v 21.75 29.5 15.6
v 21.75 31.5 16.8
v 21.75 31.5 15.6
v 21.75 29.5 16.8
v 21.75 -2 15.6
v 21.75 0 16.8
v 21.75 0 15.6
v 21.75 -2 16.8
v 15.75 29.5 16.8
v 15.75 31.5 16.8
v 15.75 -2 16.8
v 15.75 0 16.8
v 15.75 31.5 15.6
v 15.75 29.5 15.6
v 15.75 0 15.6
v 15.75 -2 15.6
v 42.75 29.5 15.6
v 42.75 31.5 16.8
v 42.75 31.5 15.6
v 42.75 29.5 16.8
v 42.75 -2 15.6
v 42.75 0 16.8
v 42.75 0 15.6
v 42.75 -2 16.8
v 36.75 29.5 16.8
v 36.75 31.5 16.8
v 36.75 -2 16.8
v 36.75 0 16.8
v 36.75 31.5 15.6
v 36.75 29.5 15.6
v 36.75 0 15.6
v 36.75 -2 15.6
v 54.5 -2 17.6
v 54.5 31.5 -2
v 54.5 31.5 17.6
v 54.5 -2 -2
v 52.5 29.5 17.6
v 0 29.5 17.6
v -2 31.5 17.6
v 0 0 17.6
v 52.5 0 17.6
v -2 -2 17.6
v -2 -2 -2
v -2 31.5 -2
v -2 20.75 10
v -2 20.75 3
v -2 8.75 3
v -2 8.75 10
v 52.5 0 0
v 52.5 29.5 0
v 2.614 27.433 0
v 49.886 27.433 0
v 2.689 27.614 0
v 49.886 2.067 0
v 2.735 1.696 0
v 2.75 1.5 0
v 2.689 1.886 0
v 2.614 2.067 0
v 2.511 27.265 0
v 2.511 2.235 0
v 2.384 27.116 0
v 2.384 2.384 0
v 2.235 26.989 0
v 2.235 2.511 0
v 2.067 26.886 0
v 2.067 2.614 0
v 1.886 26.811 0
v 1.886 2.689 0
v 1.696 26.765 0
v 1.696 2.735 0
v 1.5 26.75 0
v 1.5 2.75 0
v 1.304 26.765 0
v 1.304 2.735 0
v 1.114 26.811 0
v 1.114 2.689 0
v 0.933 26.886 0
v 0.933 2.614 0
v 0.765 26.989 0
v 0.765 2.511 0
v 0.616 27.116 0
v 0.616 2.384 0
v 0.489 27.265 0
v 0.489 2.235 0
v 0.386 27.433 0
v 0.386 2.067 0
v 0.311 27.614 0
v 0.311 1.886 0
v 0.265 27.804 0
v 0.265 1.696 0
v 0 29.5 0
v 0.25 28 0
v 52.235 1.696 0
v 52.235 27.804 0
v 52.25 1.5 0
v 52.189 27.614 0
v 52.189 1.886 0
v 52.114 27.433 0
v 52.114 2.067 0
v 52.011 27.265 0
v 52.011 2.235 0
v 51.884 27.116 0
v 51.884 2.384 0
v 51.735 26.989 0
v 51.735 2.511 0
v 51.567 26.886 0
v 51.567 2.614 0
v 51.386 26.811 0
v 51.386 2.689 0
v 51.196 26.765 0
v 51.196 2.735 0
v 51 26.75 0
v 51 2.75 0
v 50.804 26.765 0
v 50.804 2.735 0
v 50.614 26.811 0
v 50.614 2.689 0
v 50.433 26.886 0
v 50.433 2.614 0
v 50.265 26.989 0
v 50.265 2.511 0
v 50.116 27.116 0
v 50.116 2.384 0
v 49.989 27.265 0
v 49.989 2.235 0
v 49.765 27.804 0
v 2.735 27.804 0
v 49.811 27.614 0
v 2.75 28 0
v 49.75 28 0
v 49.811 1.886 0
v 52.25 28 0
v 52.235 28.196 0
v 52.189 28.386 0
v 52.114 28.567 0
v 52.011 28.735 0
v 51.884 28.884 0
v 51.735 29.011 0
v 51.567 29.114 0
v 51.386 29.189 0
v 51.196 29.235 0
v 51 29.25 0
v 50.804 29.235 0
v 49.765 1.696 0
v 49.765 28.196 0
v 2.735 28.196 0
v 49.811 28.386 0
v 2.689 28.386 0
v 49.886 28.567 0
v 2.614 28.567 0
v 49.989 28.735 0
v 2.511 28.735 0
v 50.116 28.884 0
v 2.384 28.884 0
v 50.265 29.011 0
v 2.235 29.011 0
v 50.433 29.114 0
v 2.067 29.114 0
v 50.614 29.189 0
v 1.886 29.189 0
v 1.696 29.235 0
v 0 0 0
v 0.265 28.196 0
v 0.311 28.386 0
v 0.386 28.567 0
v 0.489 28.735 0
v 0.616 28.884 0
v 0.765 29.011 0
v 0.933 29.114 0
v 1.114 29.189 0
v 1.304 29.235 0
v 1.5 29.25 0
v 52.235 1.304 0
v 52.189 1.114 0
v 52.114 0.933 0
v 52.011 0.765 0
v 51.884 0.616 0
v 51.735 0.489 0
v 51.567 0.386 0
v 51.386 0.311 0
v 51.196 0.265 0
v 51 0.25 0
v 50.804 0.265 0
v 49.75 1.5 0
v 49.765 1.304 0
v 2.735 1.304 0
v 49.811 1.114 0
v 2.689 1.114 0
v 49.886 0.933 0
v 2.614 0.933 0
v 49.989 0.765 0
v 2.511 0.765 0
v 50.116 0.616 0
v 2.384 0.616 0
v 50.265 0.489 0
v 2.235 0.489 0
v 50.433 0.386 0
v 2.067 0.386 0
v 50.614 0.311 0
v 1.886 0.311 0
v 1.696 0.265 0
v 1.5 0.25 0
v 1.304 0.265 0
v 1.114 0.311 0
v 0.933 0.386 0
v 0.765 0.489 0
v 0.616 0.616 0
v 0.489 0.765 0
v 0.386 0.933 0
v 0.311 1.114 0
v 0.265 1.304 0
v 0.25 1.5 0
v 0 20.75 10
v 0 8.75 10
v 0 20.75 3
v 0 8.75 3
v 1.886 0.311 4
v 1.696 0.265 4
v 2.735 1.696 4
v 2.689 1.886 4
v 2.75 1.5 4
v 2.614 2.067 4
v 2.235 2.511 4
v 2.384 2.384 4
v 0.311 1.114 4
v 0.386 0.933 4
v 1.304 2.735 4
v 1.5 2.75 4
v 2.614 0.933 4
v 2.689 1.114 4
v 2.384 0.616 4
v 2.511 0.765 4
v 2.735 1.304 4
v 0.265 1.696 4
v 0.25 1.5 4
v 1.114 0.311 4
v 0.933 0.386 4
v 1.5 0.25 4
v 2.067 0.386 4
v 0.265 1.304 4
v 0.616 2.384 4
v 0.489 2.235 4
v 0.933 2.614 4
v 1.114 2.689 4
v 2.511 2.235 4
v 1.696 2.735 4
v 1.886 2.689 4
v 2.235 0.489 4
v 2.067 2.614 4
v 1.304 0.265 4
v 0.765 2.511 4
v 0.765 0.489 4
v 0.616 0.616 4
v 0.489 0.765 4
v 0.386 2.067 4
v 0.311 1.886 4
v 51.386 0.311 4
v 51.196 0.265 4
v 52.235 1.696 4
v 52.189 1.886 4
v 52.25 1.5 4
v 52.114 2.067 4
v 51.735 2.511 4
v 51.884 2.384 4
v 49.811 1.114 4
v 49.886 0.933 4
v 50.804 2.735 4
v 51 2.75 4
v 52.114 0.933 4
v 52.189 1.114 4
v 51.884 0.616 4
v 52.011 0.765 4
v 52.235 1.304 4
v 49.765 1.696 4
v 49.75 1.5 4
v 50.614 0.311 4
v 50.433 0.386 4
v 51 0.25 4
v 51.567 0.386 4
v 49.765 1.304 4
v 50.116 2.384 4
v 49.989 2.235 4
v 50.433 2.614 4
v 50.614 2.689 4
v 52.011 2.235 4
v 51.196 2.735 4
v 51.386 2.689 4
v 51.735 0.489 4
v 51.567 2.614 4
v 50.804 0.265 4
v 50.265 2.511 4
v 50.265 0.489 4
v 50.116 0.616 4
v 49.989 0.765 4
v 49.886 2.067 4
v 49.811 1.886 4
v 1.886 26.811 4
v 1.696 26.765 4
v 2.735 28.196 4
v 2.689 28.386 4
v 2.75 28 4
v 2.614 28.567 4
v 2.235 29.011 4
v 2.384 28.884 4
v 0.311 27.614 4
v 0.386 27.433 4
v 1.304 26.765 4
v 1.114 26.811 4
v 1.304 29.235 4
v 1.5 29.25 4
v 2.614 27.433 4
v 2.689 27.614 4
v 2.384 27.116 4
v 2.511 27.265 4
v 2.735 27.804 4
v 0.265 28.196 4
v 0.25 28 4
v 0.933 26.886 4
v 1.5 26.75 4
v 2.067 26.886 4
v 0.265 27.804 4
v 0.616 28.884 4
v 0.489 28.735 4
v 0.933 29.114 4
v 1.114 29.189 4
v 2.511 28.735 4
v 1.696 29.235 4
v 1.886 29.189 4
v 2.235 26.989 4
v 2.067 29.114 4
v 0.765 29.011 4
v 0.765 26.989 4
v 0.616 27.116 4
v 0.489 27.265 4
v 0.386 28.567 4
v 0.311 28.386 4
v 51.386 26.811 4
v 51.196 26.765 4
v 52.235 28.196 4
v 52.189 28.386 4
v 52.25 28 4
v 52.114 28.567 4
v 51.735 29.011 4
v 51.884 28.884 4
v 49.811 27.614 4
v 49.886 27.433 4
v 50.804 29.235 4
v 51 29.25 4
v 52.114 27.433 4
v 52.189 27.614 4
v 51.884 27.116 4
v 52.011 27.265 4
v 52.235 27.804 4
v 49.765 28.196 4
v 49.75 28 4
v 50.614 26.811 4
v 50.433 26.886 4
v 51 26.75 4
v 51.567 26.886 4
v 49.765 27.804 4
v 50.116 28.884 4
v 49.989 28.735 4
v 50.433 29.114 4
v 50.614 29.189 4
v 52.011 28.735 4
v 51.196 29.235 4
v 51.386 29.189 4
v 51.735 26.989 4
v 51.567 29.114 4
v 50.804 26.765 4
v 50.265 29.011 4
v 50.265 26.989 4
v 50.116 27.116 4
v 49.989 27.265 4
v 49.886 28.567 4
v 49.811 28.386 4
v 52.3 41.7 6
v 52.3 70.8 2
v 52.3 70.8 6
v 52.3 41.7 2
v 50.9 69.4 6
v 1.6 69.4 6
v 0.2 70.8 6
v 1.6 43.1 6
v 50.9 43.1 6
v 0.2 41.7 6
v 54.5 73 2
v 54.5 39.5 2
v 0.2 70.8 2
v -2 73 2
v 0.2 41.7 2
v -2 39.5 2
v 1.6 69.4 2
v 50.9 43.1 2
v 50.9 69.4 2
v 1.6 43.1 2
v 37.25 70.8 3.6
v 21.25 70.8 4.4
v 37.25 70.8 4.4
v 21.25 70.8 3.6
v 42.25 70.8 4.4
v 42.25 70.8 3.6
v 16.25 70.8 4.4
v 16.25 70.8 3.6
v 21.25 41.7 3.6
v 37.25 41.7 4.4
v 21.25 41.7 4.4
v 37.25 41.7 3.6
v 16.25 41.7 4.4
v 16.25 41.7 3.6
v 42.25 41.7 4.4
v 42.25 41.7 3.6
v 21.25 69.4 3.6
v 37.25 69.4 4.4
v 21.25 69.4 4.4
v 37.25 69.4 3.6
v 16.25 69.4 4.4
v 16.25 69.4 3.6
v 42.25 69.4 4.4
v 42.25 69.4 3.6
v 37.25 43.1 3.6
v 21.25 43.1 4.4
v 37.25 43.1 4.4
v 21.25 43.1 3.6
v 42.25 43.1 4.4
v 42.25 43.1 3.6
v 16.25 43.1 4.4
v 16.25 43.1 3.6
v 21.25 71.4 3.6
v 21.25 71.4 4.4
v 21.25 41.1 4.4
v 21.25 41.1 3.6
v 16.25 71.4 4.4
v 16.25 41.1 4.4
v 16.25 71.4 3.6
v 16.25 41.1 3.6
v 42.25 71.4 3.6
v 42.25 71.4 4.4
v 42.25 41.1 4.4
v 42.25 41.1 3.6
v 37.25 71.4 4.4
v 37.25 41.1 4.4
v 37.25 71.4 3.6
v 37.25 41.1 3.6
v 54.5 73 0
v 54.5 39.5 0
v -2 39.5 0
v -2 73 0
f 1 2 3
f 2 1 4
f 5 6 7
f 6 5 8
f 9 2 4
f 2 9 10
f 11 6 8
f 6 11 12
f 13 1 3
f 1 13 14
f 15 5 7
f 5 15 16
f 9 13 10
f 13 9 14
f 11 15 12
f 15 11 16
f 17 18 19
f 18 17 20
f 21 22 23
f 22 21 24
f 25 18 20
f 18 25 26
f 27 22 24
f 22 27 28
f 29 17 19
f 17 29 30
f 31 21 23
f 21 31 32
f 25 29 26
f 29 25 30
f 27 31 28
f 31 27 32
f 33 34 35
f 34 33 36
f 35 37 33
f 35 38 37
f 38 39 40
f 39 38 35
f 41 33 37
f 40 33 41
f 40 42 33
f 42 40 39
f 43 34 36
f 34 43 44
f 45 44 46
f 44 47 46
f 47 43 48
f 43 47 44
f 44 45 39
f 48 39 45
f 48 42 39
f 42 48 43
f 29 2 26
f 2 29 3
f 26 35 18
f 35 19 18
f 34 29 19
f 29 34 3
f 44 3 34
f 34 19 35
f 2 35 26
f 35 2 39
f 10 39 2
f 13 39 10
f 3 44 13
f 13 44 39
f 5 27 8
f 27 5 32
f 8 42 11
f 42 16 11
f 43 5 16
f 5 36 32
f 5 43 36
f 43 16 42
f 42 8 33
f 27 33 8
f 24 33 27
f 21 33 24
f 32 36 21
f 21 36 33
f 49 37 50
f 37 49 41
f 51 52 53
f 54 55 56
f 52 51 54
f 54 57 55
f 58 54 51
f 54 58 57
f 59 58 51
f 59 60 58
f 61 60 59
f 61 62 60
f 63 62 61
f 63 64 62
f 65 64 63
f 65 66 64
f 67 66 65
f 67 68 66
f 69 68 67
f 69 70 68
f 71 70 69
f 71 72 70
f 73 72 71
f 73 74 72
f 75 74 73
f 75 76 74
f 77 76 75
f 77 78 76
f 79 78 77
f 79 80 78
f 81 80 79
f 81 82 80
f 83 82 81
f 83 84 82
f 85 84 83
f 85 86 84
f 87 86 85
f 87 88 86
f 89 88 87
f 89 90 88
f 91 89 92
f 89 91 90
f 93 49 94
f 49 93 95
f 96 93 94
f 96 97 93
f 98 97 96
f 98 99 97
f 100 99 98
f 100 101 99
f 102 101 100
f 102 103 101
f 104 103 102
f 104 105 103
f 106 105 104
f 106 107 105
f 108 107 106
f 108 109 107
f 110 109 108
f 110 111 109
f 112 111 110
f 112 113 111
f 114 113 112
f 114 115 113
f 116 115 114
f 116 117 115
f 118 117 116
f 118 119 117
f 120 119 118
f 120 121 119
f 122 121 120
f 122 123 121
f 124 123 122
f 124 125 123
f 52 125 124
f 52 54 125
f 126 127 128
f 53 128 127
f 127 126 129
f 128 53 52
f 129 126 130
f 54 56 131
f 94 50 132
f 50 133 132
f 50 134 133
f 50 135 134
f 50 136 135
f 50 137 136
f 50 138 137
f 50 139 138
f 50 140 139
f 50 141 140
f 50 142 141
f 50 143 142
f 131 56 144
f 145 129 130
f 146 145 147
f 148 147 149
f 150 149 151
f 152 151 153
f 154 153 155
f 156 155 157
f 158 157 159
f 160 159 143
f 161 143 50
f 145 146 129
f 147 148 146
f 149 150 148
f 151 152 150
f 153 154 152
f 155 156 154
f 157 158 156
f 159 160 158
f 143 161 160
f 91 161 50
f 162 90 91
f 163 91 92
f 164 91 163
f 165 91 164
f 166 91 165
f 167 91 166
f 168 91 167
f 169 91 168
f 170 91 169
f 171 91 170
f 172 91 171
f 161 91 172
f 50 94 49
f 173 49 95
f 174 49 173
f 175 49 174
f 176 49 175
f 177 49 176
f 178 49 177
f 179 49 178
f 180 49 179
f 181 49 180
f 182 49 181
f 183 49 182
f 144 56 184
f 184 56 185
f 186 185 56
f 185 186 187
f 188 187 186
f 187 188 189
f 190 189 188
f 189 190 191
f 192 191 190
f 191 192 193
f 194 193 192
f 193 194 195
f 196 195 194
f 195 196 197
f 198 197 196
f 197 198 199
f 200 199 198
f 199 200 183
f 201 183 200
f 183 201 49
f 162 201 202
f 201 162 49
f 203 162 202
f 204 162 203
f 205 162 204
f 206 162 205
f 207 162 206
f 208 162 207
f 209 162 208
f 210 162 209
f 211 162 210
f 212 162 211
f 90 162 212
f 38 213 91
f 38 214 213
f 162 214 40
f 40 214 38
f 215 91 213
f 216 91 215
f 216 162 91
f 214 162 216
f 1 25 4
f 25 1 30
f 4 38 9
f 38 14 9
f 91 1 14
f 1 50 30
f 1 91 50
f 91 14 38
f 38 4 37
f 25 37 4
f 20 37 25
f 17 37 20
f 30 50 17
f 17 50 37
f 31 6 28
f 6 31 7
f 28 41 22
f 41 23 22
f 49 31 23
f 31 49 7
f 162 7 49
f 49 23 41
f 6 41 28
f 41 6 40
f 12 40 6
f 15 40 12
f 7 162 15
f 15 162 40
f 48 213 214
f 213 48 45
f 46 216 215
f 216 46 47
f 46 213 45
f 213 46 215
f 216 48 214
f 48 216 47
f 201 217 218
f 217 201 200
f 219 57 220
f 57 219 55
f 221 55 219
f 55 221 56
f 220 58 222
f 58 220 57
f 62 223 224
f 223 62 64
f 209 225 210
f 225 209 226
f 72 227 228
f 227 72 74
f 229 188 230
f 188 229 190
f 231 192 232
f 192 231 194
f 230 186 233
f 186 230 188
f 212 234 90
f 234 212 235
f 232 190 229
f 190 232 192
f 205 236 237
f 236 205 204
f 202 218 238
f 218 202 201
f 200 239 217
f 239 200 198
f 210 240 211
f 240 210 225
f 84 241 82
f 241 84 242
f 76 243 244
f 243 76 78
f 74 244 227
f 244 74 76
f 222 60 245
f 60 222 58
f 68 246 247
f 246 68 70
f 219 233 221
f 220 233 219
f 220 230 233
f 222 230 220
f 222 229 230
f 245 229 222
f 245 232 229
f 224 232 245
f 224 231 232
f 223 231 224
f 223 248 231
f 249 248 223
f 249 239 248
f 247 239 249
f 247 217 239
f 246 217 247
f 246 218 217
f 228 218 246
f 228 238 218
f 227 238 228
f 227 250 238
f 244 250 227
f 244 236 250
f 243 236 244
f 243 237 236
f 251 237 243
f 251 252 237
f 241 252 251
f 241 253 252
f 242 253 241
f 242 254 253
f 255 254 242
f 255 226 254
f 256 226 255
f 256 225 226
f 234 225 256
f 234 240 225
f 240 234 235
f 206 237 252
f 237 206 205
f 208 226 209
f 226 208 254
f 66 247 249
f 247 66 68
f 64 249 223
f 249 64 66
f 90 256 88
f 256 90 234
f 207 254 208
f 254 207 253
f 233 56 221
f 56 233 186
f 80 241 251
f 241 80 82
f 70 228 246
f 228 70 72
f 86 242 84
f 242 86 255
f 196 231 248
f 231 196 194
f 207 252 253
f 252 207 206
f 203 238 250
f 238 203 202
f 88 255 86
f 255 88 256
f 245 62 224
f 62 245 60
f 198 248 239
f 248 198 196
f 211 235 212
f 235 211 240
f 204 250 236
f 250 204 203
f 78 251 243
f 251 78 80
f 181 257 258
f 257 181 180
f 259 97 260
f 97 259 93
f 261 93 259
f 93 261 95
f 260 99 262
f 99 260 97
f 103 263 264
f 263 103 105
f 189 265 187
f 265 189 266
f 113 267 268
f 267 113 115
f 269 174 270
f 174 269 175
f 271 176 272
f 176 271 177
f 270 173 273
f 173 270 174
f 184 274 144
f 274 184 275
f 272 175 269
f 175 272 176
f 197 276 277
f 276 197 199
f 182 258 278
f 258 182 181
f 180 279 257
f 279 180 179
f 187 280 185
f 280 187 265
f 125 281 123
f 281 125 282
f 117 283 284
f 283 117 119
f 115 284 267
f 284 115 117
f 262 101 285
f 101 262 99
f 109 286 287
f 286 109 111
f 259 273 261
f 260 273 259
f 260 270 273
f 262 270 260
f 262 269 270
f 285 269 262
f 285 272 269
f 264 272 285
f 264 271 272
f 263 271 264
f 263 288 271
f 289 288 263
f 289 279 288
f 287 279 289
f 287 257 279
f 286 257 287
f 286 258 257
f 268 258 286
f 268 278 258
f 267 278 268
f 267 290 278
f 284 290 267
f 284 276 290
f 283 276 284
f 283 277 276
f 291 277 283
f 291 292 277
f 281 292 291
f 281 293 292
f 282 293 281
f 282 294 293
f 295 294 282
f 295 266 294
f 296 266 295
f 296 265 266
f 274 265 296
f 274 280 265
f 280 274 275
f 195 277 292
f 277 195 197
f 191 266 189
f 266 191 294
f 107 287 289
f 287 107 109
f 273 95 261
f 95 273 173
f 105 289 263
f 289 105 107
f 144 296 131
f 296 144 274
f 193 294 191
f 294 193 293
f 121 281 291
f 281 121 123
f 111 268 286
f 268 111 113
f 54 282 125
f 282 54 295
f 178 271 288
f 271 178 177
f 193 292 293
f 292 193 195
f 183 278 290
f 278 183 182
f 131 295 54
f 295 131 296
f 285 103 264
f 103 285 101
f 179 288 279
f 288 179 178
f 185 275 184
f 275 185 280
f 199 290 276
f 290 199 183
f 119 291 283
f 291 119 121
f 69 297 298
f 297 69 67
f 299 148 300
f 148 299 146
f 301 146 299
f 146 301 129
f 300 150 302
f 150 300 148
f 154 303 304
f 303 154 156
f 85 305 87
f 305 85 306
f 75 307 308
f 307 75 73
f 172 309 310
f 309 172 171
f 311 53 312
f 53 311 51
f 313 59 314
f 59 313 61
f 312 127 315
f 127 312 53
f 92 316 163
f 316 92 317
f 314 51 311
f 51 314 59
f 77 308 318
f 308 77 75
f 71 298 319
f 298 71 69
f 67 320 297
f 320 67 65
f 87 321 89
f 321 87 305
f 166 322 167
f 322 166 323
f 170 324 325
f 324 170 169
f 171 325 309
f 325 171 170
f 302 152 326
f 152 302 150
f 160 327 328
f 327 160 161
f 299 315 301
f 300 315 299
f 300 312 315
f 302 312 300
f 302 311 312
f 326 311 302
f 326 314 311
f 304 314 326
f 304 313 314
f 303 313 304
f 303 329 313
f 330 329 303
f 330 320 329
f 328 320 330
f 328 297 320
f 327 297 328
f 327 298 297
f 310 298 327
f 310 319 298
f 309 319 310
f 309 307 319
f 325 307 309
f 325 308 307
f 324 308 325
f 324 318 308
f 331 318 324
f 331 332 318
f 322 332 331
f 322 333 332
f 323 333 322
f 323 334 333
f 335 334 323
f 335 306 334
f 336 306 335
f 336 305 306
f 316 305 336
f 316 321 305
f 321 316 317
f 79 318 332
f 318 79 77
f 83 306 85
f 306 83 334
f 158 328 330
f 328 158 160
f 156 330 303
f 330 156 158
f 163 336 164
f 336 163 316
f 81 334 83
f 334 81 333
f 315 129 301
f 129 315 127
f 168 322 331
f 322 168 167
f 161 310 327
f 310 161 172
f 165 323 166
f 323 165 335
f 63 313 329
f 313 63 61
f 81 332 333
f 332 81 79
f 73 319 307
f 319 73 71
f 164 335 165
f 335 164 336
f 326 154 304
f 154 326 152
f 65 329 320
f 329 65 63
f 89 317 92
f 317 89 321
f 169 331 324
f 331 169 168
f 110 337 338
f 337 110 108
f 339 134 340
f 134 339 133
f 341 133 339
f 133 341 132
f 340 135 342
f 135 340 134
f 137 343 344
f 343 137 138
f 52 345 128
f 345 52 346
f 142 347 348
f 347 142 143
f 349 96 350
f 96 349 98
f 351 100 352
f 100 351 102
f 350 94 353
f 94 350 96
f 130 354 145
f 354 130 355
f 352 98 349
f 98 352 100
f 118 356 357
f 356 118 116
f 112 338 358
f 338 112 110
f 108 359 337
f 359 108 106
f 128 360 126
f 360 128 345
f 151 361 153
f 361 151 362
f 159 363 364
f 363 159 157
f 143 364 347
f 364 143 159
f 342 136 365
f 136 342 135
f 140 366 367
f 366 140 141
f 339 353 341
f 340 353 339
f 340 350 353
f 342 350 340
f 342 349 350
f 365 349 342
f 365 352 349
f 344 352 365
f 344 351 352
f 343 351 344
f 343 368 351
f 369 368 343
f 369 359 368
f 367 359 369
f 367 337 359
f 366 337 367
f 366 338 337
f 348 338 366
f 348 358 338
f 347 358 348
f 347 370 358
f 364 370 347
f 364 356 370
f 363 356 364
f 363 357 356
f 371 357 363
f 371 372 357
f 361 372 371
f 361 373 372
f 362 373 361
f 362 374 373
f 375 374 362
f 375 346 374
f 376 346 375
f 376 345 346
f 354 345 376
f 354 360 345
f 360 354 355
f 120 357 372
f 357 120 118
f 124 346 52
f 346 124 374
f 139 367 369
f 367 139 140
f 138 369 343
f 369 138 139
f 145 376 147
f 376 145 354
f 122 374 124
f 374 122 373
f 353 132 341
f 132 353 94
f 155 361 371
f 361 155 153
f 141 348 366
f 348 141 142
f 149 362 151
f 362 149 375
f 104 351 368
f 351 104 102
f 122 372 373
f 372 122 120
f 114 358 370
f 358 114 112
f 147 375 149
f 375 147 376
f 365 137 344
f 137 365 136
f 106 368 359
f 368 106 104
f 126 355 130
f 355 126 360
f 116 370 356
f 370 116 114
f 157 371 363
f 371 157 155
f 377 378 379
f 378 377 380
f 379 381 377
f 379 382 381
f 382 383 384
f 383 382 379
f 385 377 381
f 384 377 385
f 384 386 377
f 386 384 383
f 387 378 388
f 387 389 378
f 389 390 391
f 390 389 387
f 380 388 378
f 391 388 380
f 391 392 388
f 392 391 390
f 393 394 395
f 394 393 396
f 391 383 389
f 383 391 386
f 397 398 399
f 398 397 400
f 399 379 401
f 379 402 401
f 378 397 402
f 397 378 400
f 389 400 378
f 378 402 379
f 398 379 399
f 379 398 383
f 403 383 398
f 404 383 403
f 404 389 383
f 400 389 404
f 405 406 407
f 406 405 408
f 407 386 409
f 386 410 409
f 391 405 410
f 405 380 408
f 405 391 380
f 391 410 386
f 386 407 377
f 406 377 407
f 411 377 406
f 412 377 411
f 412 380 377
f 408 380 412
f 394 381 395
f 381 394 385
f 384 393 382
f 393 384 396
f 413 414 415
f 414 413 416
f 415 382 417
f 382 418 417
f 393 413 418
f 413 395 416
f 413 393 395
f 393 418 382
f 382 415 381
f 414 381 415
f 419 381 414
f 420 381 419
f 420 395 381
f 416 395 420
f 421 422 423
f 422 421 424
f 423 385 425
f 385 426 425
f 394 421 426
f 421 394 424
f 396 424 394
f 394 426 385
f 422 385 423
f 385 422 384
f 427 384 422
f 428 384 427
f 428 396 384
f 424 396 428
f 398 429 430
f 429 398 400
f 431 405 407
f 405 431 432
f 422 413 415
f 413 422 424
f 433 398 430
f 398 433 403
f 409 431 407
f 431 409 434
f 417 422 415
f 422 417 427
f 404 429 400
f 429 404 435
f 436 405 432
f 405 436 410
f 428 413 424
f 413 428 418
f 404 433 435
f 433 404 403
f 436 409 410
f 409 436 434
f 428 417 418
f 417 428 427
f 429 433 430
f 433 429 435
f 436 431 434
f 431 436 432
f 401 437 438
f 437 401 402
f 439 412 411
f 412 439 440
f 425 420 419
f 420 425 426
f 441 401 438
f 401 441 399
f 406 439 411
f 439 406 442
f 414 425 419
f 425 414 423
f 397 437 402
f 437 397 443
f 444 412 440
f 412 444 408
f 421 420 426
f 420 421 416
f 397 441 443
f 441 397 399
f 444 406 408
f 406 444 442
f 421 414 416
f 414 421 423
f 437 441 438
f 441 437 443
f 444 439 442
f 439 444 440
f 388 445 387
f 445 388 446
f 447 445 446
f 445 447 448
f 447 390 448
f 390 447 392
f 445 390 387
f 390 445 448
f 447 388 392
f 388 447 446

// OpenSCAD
// Two-part case for common ESP32 / LoRa boards (base + snap lid). CC0.
// Board sizes (L x W, mm): ESP32 DevKit V1 30-pin 51.5x28.5, 38-pin 55x28,
// Heltec WiFi LoRa 32 V3 50.2x25.5, TTGO/LILYGO LoRa32 V2.1 61x26, Wemos D1 mini 34.2x25.6.
// The USB opening is on the -X end. part = "base" | "lid" | "both". antenna = SMA hole on +X end.
board = [51.5, 28.5]; board_h = 1.6; under = 4; above = 12; wall = 2; usb = [12, 7]; antenna = 0; part = "both";
$fn = 40;
in = [board[0] + 1, board[1] + 1, under + board_h + above];
module base() {
  difference() {
    translate([-wall, -wall, -wall]) cube([in[0] + 2 * wall, in[1] + 2 * wall, in[2] + wall]);
    cube([in[0], in[1], in[2] + 1]);
    translate([-wall - 1, in[1] / 2 - usb[0] / 2, under - 1]) cube([wall + 2, usb[0], usb[1]]);
    if (antenna > 0) translate([in[0] - 1, in[1] / 2, under + board_h + 6]) rotate([0, 90, 0]) cylinder(d = antenna, h = wall + 2);
    for (x = [in[0] * 0.3, in[0] * 0.7]) translate([x, -wall - 1, in[2] - 2]) cube([6, in[1] + 2 * wall + 2, 1.2]);
  }
  for (p = [[1.5, 1.5], [in[0] - 1.5, 1.5], [1.5, in[1] - 1.5], [in[0] - 1.5, in[1] - 1.5]]) translate([p[0], p[1], 0]) cylinder(d = 2.5, h = under);
}
module lid() {
  translate([-wall, -wall, 0]) cube([in[0] + 2 * wall, in[1] + 2 * wall, wall]);
  difference() {
    translate([0.2, 0.2, wall]) cube([in[0] - 0.4, in[1] - 0.4, 4]);
    translate([1.6, 1.6, wall]) cube([in[0] - 3.2, in[1] - 3.2, 5]);
  }
  for (x = [in[0] * 0.3, in[0] * 0.7]) translate([x + 0.5, -0.4, wall + 1.6]) cube([5, in[1] + 0.8, 0.8]);
}
if (part == "base" || part == "both") base();
if (part == "lid" || part == "both") translate([0, in[1] + 3 * wall + 6, 0]) lid();
